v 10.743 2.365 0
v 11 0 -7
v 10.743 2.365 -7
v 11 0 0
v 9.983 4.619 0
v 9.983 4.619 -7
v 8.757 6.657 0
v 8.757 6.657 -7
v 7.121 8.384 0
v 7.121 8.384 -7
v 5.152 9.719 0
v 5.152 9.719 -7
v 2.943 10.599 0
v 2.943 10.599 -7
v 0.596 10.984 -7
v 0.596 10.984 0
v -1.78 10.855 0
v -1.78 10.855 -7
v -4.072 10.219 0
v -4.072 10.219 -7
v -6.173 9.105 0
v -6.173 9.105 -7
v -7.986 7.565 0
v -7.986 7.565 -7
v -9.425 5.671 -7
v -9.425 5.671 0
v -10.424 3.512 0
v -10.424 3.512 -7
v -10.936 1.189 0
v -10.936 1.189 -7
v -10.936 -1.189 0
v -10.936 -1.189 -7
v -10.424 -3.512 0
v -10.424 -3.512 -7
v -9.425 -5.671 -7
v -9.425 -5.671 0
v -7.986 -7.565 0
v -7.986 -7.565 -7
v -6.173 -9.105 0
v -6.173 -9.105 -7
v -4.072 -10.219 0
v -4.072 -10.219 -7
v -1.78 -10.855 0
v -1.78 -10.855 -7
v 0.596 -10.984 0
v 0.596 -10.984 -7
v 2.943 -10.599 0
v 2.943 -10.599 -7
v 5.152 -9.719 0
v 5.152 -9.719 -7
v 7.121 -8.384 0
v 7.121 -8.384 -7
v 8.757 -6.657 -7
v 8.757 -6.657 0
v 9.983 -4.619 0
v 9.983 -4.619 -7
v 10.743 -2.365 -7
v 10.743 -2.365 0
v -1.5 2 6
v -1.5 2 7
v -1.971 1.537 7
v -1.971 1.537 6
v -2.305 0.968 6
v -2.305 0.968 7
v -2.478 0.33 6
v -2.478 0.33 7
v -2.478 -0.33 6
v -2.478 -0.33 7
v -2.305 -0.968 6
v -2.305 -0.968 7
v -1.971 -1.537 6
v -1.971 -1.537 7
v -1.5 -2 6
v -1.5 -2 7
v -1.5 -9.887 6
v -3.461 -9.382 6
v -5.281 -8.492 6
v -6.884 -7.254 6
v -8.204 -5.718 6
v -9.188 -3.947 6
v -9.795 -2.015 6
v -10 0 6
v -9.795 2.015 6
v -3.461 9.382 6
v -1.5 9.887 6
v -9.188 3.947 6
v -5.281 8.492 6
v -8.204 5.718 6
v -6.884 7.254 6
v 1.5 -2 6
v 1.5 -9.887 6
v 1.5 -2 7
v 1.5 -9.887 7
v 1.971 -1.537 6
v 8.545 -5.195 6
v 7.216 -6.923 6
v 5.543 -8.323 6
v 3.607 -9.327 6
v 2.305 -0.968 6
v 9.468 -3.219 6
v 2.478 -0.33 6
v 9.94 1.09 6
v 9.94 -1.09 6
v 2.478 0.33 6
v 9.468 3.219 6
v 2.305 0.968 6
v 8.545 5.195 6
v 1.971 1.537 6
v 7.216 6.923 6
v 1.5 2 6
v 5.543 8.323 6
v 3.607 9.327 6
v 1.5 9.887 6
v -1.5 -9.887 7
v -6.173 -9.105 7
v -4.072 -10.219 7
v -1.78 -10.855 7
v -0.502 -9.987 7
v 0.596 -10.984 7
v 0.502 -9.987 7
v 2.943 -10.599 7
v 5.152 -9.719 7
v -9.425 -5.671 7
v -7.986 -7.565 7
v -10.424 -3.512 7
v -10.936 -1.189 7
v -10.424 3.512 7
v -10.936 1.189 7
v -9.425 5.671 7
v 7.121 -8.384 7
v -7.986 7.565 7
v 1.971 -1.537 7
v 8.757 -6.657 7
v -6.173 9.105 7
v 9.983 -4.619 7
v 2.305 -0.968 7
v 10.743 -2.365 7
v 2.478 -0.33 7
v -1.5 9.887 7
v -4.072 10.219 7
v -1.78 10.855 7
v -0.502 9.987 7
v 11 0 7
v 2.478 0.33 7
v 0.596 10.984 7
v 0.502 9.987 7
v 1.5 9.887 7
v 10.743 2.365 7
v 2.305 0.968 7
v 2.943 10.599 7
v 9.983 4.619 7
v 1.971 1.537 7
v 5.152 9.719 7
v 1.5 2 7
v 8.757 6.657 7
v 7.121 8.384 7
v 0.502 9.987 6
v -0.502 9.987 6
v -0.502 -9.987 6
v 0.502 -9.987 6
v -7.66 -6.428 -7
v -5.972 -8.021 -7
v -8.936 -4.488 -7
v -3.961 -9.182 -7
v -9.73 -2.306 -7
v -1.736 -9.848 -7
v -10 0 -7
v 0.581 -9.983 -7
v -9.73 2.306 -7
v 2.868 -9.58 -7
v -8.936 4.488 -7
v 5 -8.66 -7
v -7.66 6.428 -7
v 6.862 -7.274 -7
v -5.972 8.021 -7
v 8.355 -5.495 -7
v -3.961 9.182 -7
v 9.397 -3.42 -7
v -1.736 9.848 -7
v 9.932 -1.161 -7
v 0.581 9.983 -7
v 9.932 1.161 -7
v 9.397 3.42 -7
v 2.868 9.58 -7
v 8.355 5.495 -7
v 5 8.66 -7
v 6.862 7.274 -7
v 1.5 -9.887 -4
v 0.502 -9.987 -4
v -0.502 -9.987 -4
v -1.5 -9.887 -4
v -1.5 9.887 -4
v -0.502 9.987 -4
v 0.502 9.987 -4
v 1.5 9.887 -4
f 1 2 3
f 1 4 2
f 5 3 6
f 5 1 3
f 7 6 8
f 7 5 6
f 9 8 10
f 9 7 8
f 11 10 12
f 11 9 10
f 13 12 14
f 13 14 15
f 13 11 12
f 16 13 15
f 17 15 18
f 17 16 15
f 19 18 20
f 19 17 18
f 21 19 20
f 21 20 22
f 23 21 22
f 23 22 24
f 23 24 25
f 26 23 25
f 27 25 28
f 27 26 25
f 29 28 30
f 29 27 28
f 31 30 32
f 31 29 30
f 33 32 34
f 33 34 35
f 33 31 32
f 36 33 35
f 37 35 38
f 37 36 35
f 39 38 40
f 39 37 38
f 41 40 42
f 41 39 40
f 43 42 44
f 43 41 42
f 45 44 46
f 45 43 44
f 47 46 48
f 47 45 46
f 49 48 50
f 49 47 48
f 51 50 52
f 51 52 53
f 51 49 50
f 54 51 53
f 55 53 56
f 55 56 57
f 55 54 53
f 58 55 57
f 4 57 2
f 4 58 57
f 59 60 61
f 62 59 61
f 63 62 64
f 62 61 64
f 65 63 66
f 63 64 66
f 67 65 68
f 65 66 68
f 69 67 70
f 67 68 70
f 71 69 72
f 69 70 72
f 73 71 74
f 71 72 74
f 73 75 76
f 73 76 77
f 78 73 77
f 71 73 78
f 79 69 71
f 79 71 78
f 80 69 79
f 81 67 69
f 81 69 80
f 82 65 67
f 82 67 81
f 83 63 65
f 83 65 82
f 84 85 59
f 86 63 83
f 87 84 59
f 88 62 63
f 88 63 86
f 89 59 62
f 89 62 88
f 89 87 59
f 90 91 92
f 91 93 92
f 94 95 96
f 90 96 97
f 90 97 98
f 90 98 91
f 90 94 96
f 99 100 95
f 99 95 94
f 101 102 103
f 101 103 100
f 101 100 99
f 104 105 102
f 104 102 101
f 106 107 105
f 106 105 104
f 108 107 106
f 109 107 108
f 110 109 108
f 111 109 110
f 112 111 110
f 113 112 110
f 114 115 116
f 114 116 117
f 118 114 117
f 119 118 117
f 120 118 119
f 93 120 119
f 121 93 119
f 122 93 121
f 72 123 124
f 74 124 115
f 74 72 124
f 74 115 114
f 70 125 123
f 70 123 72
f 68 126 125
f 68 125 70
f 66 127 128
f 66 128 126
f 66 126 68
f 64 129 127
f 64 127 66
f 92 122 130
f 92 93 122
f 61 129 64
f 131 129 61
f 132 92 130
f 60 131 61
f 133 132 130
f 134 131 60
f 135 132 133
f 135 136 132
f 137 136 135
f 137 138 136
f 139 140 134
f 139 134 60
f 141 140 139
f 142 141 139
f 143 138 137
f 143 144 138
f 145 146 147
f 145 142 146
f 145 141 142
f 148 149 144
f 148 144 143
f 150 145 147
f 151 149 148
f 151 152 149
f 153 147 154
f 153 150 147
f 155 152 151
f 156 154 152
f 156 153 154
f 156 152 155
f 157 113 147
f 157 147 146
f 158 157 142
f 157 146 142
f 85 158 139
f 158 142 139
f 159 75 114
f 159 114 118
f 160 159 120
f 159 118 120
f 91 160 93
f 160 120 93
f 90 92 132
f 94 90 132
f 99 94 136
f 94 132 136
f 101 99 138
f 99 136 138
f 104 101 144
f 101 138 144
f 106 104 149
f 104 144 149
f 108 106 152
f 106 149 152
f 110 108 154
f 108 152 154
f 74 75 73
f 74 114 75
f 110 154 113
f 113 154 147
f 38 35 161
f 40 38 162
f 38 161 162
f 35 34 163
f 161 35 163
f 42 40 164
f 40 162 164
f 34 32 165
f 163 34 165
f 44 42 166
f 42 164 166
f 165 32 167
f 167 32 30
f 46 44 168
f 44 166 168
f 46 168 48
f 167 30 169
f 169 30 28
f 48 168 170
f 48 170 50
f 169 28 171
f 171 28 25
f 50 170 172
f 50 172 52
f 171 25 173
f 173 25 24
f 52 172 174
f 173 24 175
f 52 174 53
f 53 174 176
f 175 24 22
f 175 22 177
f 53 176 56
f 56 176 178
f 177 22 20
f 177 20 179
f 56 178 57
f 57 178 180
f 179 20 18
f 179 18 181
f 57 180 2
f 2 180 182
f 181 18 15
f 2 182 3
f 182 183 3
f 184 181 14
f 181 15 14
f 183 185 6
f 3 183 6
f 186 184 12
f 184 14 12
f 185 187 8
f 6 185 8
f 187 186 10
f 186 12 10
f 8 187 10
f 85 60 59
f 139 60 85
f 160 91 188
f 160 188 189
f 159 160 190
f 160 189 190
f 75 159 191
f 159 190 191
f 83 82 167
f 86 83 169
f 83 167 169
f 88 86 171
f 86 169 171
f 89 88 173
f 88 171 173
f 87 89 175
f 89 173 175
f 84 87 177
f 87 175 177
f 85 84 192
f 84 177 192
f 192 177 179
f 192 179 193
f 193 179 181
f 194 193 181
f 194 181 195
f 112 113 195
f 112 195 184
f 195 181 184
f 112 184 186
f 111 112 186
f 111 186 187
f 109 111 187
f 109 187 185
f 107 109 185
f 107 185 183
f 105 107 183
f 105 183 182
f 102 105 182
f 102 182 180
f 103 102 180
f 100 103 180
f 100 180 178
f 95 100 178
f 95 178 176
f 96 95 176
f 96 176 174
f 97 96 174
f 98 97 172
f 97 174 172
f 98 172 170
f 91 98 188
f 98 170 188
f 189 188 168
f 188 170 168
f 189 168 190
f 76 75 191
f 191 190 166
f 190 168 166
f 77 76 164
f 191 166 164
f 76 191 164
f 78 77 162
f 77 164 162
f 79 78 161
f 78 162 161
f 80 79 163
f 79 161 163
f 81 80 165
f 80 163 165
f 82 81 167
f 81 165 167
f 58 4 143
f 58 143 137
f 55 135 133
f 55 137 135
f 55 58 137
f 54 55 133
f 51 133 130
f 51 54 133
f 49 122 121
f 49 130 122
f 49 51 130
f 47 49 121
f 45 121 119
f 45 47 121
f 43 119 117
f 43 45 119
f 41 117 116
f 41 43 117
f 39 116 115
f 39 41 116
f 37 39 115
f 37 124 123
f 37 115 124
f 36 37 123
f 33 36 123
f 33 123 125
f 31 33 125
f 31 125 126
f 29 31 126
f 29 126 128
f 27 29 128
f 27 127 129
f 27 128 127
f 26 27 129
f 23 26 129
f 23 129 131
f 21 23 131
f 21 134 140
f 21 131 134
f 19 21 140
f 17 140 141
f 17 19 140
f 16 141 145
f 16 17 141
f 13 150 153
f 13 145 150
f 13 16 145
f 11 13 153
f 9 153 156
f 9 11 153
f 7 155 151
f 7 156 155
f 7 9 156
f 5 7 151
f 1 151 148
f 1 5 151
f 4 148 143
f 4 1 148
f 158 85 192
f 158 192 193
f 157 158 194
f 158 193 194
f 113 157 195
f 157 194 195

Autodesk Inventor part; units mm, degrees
ref_plane "YZ Plane" through (0, 0, 0) normal (1, 0, 0) x (0, 1, 0)
ref_plane "XZ Plane" through (0, 0, 0) normal (0, 1, 0) x (-1, 0, 0)
ref_plane "XY Plane" through (0, 0, 0) normal (0, 0, 1) x (1, 0, 0)
sketch "Skizze1" plane through (0, 0, 0) normal (0, 0, 1) x (1, 0, 0)
  circle A0 centre (0, 0) radius 11
  dimension "d0" = 22
extrude "Extrusion1" add sketch "Skizze1" along normal mid plane 14
sketch "Skizze2" plane through (0, 0, -7) normal (0, 0, -1) x (-1, 0, 0)
  circle A0 centre (0, 0) radius 10
  circle A1 centre (0, 0) radius 11 projected
  dimension "d3" = 1
extrude "Extrusion2" cut sketch "Skizze2" against normal blind 13 contours A0
sketch "Skizze3" plane through (0, 0, 7) normal (0, 0, 1) x (1, 0, 0)
  circle A0 centre (0, 0) radius 2.5
  circle A1 centre (0, 0) radius 10 projected
  line L0 (1.5, -9.8869) -> (1.5, 9.8869)
  line L1 (-1.5, -9.8869) -> (-1.5, 9.8869)
  point P0 (-1.5, 2)
  point P1 (-1.5, -2)
  point P2 (1.5, -2)
  point P3 (1.5, 2)
  dimension "d6" = 5
  dimension "d7" = 3
  dimension "d8" = 1.5
extrude "Extrusion3" cut sketch "Skizze3" against normal blind 11 contours A0 L0 | L0 A0 L1 | A0 L1 A1 L0 | L0 A1 L1 A0 | L1 A0
equation "\"d8\" = 0.5 * d7"
properties part number "LED-Schirm"
